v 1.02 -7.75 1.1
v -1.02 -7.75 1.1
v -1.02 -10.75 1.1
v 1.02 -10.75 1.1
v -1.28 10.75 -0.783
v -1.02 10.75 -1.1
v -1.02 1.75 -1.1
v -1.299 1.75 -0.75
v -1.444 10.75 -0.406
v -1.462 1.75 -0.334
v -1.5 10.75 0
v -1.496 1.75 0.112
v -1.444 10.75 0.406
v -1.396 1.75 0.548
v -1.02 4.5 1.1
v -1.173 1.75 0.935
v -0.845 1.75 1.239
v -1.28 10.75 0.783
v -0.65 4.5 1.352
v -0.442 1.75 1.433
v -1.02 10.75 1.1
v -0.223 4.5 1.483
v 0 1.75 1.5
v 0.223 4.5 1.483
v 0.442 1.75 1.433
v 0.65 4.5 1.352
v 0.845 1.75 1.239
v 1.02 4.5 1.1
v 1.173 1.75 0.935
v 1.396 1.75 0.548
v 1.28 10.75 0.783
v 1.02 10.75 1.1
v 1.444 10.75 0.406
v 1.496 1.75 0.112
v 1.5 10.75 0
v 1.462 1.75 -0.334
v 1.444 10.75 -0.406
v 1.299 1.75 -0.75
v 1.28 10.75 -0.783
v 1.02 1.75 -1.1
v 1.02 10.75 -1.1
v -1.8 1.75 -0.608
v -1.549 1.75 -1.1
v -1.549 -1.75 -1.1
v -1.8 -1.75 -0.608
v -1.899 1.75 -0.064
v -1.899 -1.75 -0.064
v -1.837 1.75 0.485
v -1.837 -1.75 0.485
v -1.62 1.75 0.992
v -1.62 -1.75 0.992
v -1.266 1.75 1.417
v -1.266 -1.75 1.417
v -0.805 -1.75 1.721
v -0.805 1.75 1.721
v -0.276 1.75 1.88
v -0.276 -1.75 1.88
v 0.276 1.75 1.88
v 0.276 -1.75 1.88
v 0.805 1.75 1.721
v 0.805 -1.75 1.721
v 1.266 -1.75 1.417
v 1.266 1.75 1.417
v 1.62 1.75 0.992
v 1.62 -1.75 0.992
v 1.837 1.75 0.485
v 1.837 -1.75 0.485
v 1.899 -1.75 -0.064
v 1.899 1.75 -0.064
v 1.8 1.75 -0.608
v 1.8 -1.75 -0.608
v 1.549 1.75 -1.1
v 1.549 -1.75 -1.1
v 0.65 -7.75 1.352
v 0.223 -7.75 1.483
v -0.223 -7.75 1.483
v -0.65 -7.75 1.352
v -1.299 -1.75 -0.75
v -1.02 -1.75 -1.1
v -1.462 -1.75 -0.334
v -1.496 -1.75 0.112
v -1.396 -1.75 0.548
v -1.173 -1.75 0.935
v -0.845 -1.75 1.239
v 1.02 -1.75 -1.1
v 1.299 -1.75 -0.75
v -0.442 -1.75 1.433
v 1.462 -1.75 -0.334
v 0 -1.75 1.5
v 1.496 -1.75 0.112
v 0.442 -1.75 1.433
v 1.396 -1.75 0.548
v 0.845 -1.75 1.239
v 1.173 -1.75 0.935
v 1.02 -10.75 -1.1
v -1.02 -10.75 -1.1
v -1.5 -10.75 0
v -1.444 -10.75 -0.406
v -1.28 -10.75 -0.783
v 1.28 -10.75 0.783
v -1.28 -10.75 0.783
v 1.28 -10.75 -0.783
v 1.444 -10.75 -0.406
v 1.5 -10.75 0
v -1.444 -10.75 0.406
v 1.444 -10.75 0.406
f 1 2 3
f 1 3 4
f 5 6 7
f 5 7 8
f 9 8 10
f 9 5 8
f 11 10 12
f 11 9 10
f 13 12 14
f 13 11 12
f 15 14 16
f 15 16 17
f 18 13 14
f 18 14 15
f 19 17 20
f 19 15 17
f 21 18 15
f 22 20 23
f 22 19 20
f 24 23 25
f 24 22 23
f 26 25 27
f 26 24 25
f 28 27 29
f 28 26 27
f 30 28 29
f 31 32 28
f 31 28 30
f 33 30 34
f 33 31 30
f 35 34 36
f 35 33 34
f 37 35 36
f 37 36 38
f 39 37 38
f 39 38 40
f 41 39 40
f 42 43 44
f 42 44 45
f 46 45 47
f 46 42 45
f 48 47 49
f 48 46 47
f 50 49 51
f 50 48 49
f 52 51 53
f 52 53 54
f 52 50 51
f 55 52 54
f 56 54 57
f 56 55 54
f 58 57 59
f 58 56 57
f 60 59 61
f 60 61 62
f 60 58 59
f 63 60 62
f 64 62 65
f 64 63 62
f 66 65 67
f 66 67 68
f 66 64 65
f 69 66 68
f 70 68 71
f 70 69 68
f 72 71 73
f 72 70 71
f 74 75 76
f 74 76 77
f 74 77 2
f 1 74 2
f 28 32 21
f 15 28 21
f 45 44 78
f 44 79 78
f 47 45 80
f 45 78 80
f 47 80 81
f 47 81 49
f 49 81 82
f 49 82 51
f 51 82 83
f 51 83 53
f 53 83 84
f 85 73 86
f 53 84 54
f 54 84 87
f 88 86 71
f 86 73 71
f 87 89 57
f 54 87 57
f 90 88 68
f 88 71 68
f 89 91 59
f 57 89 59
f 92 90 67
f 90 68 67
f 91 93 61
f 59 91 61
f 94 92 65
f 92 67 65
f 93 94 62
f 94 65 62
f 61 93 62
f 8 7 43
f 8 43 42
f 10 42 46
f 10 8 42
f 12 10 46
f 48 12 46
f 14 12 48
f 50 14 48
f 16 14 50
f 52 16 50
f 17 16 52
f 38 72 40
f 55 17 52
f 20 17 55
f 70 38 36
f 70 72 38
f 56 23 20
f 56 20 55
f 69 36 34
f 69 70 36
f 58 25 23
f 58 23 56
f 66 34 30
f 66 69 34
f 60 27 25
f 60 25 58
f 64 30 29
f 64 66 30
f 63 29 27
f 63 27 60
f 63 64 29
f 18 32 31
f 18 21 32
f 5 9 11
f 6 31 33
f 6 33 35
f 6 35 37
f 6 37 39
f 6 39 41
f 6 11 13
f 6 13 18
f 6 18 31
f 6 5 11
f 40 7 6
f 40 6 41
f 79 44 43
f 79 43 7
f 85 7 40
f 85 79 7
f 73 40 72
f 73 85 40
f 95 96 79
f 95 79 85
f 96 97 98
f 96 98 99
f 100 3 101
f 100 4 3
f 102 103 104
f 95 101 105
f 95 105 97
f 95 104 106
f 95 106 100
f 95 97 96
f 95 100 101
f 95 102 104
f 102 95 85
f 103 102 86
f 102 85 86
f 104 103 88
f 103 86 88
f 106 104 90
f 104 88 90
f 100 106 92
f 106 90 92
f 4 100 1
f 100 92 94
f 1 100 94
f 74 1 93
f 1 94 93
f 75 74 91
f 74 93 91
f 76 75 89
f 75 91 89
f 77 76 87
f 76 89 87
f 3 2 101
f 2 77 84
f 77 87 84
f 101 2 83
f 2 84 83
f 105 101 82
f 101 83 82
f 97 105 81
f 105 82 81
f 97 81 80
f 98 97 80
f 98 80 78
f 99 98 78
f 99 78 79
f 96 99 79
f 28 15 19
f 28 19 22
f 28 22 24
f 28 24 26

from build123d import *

# Parameters (mm, degrees)
SKETCH1_R               = 1.9
BOSS_EXTRUDE1_DEPTH     = 1.75
SKETCH2_R               = 1.5
BOSS_EXTRUDE2_DEPTH     = 9
BOSS_EXTRUDE3_START     = 9
SKETCH4_R               = 1.5
BOSS_EXTRUDE3_DEPTH     = 9
CUT_EXTRUDE1_DEPTH      = 12.08072651
CUT_EXTRUDE1_DEPTH_BACK = 12.08072651
CUT_EXTRUDE2_DEPTH      = 6.25
CUT_EXTRUDE3_START      = -3
CUT_EXTRUDE3_DEPTH      = 3


with BuildPart() as part:
    # Sketch1 → Boss-Extrude1 (new, symmetric)
    with BuildSketch(Plane(origin=(0, 0, 0), x_dir=(1, 0, 0), z_dir=(0, 1, 0))):
        with Locations(Location((0, 0, 0), (0, 0, 270))):
            Circle(SKETCH1_R)
    extrude(amount=BOSS_EXTRUDE1_DEPTH, both=True)

    # Sketch2 → Boss-Extrude2 (add)
    with BuildSketch(Plane.XZ.offset(1.75)):
        with Locations(Location((0, 0, 0), (0, 0, 270))):
            Circle(SKETCH2_R)
    extrude(amount=BOSS_EXTRUDE2_DEPTH)

    # Sketch4 → Boss-Extrude3 (add)
    with BuildSketch(Plane(origin=(0, 1.75, 0), x_dir=(1, 0, 0), z_dir=(0, 1, 0)).offset(BOSS_EXTRUDE3_START)):
        with Locations(Location((0, 0, 0), (0, 0, 90))):
            Circle(SKETCH4_R)
    extrude(amount=-BOSS_EXTRUDE3_DEPTH)

    # Sketch3 → Cut-Extrude1 (cut, two sides: drawn at the far end of the back side and taken through both)
    with BuildSketch(Plane(origin=(0, 0, 0), x_dir=(1, 0, 0), z_dir=(0, 1, 0)).offset(-CUT_EXTRUDE1_DEPTH_BACK)):
        with BuildLine():
            Line((-1.549193338, 1.1), (1.549193338, 1.1))
            ThreePointArc((1.549193338, 1.1), (0, 1.9), (-1.549193338, 1.1))
        make_face()
    extrude(amount=CUT_EXTRUDE1_DEPTH + CUT_EXTRUDE1_DEPTH_BACK, mode=Mode.SUBTRACT)

    # Sketch5 → Cut-Extrude2 (cut)
    with BuildSketch(Plane(origin=(0, 10.75, 0), x_dir=(1, 0, 0), z_dir=(0, 1, 0))):
        with BuildLine():
            Line((1.019803903, -1.1), (-1.019803903, -1.1))
            ThreePointArc((-1.019803903, -1.1), (0, -1.5), (1.019803903, -1.1))
        make_face()
    extrude(amount=-CUT_EXTRUDE2_DEPTH, mode=Mode.SUBTRACT)

    # Sketch6 → Cut-Extrude3 (cut)
    with BuildSketch(Plane.XZ.offset(10.75).offset(CUT_EXTRUDE3_START)):
        with BuildLine():
            Line((-1.019803903, 1.1), (1.019803903, 1.1))
            ThreePointArc((1.019803903, 1.1), (0, 1.5), (-1.019803903, 1.1))
        make_face()
    extrude(amount=CUT_EXTRUDE3_DEPTH, mode=Mode.SUBTRACT)


solid = part.part
